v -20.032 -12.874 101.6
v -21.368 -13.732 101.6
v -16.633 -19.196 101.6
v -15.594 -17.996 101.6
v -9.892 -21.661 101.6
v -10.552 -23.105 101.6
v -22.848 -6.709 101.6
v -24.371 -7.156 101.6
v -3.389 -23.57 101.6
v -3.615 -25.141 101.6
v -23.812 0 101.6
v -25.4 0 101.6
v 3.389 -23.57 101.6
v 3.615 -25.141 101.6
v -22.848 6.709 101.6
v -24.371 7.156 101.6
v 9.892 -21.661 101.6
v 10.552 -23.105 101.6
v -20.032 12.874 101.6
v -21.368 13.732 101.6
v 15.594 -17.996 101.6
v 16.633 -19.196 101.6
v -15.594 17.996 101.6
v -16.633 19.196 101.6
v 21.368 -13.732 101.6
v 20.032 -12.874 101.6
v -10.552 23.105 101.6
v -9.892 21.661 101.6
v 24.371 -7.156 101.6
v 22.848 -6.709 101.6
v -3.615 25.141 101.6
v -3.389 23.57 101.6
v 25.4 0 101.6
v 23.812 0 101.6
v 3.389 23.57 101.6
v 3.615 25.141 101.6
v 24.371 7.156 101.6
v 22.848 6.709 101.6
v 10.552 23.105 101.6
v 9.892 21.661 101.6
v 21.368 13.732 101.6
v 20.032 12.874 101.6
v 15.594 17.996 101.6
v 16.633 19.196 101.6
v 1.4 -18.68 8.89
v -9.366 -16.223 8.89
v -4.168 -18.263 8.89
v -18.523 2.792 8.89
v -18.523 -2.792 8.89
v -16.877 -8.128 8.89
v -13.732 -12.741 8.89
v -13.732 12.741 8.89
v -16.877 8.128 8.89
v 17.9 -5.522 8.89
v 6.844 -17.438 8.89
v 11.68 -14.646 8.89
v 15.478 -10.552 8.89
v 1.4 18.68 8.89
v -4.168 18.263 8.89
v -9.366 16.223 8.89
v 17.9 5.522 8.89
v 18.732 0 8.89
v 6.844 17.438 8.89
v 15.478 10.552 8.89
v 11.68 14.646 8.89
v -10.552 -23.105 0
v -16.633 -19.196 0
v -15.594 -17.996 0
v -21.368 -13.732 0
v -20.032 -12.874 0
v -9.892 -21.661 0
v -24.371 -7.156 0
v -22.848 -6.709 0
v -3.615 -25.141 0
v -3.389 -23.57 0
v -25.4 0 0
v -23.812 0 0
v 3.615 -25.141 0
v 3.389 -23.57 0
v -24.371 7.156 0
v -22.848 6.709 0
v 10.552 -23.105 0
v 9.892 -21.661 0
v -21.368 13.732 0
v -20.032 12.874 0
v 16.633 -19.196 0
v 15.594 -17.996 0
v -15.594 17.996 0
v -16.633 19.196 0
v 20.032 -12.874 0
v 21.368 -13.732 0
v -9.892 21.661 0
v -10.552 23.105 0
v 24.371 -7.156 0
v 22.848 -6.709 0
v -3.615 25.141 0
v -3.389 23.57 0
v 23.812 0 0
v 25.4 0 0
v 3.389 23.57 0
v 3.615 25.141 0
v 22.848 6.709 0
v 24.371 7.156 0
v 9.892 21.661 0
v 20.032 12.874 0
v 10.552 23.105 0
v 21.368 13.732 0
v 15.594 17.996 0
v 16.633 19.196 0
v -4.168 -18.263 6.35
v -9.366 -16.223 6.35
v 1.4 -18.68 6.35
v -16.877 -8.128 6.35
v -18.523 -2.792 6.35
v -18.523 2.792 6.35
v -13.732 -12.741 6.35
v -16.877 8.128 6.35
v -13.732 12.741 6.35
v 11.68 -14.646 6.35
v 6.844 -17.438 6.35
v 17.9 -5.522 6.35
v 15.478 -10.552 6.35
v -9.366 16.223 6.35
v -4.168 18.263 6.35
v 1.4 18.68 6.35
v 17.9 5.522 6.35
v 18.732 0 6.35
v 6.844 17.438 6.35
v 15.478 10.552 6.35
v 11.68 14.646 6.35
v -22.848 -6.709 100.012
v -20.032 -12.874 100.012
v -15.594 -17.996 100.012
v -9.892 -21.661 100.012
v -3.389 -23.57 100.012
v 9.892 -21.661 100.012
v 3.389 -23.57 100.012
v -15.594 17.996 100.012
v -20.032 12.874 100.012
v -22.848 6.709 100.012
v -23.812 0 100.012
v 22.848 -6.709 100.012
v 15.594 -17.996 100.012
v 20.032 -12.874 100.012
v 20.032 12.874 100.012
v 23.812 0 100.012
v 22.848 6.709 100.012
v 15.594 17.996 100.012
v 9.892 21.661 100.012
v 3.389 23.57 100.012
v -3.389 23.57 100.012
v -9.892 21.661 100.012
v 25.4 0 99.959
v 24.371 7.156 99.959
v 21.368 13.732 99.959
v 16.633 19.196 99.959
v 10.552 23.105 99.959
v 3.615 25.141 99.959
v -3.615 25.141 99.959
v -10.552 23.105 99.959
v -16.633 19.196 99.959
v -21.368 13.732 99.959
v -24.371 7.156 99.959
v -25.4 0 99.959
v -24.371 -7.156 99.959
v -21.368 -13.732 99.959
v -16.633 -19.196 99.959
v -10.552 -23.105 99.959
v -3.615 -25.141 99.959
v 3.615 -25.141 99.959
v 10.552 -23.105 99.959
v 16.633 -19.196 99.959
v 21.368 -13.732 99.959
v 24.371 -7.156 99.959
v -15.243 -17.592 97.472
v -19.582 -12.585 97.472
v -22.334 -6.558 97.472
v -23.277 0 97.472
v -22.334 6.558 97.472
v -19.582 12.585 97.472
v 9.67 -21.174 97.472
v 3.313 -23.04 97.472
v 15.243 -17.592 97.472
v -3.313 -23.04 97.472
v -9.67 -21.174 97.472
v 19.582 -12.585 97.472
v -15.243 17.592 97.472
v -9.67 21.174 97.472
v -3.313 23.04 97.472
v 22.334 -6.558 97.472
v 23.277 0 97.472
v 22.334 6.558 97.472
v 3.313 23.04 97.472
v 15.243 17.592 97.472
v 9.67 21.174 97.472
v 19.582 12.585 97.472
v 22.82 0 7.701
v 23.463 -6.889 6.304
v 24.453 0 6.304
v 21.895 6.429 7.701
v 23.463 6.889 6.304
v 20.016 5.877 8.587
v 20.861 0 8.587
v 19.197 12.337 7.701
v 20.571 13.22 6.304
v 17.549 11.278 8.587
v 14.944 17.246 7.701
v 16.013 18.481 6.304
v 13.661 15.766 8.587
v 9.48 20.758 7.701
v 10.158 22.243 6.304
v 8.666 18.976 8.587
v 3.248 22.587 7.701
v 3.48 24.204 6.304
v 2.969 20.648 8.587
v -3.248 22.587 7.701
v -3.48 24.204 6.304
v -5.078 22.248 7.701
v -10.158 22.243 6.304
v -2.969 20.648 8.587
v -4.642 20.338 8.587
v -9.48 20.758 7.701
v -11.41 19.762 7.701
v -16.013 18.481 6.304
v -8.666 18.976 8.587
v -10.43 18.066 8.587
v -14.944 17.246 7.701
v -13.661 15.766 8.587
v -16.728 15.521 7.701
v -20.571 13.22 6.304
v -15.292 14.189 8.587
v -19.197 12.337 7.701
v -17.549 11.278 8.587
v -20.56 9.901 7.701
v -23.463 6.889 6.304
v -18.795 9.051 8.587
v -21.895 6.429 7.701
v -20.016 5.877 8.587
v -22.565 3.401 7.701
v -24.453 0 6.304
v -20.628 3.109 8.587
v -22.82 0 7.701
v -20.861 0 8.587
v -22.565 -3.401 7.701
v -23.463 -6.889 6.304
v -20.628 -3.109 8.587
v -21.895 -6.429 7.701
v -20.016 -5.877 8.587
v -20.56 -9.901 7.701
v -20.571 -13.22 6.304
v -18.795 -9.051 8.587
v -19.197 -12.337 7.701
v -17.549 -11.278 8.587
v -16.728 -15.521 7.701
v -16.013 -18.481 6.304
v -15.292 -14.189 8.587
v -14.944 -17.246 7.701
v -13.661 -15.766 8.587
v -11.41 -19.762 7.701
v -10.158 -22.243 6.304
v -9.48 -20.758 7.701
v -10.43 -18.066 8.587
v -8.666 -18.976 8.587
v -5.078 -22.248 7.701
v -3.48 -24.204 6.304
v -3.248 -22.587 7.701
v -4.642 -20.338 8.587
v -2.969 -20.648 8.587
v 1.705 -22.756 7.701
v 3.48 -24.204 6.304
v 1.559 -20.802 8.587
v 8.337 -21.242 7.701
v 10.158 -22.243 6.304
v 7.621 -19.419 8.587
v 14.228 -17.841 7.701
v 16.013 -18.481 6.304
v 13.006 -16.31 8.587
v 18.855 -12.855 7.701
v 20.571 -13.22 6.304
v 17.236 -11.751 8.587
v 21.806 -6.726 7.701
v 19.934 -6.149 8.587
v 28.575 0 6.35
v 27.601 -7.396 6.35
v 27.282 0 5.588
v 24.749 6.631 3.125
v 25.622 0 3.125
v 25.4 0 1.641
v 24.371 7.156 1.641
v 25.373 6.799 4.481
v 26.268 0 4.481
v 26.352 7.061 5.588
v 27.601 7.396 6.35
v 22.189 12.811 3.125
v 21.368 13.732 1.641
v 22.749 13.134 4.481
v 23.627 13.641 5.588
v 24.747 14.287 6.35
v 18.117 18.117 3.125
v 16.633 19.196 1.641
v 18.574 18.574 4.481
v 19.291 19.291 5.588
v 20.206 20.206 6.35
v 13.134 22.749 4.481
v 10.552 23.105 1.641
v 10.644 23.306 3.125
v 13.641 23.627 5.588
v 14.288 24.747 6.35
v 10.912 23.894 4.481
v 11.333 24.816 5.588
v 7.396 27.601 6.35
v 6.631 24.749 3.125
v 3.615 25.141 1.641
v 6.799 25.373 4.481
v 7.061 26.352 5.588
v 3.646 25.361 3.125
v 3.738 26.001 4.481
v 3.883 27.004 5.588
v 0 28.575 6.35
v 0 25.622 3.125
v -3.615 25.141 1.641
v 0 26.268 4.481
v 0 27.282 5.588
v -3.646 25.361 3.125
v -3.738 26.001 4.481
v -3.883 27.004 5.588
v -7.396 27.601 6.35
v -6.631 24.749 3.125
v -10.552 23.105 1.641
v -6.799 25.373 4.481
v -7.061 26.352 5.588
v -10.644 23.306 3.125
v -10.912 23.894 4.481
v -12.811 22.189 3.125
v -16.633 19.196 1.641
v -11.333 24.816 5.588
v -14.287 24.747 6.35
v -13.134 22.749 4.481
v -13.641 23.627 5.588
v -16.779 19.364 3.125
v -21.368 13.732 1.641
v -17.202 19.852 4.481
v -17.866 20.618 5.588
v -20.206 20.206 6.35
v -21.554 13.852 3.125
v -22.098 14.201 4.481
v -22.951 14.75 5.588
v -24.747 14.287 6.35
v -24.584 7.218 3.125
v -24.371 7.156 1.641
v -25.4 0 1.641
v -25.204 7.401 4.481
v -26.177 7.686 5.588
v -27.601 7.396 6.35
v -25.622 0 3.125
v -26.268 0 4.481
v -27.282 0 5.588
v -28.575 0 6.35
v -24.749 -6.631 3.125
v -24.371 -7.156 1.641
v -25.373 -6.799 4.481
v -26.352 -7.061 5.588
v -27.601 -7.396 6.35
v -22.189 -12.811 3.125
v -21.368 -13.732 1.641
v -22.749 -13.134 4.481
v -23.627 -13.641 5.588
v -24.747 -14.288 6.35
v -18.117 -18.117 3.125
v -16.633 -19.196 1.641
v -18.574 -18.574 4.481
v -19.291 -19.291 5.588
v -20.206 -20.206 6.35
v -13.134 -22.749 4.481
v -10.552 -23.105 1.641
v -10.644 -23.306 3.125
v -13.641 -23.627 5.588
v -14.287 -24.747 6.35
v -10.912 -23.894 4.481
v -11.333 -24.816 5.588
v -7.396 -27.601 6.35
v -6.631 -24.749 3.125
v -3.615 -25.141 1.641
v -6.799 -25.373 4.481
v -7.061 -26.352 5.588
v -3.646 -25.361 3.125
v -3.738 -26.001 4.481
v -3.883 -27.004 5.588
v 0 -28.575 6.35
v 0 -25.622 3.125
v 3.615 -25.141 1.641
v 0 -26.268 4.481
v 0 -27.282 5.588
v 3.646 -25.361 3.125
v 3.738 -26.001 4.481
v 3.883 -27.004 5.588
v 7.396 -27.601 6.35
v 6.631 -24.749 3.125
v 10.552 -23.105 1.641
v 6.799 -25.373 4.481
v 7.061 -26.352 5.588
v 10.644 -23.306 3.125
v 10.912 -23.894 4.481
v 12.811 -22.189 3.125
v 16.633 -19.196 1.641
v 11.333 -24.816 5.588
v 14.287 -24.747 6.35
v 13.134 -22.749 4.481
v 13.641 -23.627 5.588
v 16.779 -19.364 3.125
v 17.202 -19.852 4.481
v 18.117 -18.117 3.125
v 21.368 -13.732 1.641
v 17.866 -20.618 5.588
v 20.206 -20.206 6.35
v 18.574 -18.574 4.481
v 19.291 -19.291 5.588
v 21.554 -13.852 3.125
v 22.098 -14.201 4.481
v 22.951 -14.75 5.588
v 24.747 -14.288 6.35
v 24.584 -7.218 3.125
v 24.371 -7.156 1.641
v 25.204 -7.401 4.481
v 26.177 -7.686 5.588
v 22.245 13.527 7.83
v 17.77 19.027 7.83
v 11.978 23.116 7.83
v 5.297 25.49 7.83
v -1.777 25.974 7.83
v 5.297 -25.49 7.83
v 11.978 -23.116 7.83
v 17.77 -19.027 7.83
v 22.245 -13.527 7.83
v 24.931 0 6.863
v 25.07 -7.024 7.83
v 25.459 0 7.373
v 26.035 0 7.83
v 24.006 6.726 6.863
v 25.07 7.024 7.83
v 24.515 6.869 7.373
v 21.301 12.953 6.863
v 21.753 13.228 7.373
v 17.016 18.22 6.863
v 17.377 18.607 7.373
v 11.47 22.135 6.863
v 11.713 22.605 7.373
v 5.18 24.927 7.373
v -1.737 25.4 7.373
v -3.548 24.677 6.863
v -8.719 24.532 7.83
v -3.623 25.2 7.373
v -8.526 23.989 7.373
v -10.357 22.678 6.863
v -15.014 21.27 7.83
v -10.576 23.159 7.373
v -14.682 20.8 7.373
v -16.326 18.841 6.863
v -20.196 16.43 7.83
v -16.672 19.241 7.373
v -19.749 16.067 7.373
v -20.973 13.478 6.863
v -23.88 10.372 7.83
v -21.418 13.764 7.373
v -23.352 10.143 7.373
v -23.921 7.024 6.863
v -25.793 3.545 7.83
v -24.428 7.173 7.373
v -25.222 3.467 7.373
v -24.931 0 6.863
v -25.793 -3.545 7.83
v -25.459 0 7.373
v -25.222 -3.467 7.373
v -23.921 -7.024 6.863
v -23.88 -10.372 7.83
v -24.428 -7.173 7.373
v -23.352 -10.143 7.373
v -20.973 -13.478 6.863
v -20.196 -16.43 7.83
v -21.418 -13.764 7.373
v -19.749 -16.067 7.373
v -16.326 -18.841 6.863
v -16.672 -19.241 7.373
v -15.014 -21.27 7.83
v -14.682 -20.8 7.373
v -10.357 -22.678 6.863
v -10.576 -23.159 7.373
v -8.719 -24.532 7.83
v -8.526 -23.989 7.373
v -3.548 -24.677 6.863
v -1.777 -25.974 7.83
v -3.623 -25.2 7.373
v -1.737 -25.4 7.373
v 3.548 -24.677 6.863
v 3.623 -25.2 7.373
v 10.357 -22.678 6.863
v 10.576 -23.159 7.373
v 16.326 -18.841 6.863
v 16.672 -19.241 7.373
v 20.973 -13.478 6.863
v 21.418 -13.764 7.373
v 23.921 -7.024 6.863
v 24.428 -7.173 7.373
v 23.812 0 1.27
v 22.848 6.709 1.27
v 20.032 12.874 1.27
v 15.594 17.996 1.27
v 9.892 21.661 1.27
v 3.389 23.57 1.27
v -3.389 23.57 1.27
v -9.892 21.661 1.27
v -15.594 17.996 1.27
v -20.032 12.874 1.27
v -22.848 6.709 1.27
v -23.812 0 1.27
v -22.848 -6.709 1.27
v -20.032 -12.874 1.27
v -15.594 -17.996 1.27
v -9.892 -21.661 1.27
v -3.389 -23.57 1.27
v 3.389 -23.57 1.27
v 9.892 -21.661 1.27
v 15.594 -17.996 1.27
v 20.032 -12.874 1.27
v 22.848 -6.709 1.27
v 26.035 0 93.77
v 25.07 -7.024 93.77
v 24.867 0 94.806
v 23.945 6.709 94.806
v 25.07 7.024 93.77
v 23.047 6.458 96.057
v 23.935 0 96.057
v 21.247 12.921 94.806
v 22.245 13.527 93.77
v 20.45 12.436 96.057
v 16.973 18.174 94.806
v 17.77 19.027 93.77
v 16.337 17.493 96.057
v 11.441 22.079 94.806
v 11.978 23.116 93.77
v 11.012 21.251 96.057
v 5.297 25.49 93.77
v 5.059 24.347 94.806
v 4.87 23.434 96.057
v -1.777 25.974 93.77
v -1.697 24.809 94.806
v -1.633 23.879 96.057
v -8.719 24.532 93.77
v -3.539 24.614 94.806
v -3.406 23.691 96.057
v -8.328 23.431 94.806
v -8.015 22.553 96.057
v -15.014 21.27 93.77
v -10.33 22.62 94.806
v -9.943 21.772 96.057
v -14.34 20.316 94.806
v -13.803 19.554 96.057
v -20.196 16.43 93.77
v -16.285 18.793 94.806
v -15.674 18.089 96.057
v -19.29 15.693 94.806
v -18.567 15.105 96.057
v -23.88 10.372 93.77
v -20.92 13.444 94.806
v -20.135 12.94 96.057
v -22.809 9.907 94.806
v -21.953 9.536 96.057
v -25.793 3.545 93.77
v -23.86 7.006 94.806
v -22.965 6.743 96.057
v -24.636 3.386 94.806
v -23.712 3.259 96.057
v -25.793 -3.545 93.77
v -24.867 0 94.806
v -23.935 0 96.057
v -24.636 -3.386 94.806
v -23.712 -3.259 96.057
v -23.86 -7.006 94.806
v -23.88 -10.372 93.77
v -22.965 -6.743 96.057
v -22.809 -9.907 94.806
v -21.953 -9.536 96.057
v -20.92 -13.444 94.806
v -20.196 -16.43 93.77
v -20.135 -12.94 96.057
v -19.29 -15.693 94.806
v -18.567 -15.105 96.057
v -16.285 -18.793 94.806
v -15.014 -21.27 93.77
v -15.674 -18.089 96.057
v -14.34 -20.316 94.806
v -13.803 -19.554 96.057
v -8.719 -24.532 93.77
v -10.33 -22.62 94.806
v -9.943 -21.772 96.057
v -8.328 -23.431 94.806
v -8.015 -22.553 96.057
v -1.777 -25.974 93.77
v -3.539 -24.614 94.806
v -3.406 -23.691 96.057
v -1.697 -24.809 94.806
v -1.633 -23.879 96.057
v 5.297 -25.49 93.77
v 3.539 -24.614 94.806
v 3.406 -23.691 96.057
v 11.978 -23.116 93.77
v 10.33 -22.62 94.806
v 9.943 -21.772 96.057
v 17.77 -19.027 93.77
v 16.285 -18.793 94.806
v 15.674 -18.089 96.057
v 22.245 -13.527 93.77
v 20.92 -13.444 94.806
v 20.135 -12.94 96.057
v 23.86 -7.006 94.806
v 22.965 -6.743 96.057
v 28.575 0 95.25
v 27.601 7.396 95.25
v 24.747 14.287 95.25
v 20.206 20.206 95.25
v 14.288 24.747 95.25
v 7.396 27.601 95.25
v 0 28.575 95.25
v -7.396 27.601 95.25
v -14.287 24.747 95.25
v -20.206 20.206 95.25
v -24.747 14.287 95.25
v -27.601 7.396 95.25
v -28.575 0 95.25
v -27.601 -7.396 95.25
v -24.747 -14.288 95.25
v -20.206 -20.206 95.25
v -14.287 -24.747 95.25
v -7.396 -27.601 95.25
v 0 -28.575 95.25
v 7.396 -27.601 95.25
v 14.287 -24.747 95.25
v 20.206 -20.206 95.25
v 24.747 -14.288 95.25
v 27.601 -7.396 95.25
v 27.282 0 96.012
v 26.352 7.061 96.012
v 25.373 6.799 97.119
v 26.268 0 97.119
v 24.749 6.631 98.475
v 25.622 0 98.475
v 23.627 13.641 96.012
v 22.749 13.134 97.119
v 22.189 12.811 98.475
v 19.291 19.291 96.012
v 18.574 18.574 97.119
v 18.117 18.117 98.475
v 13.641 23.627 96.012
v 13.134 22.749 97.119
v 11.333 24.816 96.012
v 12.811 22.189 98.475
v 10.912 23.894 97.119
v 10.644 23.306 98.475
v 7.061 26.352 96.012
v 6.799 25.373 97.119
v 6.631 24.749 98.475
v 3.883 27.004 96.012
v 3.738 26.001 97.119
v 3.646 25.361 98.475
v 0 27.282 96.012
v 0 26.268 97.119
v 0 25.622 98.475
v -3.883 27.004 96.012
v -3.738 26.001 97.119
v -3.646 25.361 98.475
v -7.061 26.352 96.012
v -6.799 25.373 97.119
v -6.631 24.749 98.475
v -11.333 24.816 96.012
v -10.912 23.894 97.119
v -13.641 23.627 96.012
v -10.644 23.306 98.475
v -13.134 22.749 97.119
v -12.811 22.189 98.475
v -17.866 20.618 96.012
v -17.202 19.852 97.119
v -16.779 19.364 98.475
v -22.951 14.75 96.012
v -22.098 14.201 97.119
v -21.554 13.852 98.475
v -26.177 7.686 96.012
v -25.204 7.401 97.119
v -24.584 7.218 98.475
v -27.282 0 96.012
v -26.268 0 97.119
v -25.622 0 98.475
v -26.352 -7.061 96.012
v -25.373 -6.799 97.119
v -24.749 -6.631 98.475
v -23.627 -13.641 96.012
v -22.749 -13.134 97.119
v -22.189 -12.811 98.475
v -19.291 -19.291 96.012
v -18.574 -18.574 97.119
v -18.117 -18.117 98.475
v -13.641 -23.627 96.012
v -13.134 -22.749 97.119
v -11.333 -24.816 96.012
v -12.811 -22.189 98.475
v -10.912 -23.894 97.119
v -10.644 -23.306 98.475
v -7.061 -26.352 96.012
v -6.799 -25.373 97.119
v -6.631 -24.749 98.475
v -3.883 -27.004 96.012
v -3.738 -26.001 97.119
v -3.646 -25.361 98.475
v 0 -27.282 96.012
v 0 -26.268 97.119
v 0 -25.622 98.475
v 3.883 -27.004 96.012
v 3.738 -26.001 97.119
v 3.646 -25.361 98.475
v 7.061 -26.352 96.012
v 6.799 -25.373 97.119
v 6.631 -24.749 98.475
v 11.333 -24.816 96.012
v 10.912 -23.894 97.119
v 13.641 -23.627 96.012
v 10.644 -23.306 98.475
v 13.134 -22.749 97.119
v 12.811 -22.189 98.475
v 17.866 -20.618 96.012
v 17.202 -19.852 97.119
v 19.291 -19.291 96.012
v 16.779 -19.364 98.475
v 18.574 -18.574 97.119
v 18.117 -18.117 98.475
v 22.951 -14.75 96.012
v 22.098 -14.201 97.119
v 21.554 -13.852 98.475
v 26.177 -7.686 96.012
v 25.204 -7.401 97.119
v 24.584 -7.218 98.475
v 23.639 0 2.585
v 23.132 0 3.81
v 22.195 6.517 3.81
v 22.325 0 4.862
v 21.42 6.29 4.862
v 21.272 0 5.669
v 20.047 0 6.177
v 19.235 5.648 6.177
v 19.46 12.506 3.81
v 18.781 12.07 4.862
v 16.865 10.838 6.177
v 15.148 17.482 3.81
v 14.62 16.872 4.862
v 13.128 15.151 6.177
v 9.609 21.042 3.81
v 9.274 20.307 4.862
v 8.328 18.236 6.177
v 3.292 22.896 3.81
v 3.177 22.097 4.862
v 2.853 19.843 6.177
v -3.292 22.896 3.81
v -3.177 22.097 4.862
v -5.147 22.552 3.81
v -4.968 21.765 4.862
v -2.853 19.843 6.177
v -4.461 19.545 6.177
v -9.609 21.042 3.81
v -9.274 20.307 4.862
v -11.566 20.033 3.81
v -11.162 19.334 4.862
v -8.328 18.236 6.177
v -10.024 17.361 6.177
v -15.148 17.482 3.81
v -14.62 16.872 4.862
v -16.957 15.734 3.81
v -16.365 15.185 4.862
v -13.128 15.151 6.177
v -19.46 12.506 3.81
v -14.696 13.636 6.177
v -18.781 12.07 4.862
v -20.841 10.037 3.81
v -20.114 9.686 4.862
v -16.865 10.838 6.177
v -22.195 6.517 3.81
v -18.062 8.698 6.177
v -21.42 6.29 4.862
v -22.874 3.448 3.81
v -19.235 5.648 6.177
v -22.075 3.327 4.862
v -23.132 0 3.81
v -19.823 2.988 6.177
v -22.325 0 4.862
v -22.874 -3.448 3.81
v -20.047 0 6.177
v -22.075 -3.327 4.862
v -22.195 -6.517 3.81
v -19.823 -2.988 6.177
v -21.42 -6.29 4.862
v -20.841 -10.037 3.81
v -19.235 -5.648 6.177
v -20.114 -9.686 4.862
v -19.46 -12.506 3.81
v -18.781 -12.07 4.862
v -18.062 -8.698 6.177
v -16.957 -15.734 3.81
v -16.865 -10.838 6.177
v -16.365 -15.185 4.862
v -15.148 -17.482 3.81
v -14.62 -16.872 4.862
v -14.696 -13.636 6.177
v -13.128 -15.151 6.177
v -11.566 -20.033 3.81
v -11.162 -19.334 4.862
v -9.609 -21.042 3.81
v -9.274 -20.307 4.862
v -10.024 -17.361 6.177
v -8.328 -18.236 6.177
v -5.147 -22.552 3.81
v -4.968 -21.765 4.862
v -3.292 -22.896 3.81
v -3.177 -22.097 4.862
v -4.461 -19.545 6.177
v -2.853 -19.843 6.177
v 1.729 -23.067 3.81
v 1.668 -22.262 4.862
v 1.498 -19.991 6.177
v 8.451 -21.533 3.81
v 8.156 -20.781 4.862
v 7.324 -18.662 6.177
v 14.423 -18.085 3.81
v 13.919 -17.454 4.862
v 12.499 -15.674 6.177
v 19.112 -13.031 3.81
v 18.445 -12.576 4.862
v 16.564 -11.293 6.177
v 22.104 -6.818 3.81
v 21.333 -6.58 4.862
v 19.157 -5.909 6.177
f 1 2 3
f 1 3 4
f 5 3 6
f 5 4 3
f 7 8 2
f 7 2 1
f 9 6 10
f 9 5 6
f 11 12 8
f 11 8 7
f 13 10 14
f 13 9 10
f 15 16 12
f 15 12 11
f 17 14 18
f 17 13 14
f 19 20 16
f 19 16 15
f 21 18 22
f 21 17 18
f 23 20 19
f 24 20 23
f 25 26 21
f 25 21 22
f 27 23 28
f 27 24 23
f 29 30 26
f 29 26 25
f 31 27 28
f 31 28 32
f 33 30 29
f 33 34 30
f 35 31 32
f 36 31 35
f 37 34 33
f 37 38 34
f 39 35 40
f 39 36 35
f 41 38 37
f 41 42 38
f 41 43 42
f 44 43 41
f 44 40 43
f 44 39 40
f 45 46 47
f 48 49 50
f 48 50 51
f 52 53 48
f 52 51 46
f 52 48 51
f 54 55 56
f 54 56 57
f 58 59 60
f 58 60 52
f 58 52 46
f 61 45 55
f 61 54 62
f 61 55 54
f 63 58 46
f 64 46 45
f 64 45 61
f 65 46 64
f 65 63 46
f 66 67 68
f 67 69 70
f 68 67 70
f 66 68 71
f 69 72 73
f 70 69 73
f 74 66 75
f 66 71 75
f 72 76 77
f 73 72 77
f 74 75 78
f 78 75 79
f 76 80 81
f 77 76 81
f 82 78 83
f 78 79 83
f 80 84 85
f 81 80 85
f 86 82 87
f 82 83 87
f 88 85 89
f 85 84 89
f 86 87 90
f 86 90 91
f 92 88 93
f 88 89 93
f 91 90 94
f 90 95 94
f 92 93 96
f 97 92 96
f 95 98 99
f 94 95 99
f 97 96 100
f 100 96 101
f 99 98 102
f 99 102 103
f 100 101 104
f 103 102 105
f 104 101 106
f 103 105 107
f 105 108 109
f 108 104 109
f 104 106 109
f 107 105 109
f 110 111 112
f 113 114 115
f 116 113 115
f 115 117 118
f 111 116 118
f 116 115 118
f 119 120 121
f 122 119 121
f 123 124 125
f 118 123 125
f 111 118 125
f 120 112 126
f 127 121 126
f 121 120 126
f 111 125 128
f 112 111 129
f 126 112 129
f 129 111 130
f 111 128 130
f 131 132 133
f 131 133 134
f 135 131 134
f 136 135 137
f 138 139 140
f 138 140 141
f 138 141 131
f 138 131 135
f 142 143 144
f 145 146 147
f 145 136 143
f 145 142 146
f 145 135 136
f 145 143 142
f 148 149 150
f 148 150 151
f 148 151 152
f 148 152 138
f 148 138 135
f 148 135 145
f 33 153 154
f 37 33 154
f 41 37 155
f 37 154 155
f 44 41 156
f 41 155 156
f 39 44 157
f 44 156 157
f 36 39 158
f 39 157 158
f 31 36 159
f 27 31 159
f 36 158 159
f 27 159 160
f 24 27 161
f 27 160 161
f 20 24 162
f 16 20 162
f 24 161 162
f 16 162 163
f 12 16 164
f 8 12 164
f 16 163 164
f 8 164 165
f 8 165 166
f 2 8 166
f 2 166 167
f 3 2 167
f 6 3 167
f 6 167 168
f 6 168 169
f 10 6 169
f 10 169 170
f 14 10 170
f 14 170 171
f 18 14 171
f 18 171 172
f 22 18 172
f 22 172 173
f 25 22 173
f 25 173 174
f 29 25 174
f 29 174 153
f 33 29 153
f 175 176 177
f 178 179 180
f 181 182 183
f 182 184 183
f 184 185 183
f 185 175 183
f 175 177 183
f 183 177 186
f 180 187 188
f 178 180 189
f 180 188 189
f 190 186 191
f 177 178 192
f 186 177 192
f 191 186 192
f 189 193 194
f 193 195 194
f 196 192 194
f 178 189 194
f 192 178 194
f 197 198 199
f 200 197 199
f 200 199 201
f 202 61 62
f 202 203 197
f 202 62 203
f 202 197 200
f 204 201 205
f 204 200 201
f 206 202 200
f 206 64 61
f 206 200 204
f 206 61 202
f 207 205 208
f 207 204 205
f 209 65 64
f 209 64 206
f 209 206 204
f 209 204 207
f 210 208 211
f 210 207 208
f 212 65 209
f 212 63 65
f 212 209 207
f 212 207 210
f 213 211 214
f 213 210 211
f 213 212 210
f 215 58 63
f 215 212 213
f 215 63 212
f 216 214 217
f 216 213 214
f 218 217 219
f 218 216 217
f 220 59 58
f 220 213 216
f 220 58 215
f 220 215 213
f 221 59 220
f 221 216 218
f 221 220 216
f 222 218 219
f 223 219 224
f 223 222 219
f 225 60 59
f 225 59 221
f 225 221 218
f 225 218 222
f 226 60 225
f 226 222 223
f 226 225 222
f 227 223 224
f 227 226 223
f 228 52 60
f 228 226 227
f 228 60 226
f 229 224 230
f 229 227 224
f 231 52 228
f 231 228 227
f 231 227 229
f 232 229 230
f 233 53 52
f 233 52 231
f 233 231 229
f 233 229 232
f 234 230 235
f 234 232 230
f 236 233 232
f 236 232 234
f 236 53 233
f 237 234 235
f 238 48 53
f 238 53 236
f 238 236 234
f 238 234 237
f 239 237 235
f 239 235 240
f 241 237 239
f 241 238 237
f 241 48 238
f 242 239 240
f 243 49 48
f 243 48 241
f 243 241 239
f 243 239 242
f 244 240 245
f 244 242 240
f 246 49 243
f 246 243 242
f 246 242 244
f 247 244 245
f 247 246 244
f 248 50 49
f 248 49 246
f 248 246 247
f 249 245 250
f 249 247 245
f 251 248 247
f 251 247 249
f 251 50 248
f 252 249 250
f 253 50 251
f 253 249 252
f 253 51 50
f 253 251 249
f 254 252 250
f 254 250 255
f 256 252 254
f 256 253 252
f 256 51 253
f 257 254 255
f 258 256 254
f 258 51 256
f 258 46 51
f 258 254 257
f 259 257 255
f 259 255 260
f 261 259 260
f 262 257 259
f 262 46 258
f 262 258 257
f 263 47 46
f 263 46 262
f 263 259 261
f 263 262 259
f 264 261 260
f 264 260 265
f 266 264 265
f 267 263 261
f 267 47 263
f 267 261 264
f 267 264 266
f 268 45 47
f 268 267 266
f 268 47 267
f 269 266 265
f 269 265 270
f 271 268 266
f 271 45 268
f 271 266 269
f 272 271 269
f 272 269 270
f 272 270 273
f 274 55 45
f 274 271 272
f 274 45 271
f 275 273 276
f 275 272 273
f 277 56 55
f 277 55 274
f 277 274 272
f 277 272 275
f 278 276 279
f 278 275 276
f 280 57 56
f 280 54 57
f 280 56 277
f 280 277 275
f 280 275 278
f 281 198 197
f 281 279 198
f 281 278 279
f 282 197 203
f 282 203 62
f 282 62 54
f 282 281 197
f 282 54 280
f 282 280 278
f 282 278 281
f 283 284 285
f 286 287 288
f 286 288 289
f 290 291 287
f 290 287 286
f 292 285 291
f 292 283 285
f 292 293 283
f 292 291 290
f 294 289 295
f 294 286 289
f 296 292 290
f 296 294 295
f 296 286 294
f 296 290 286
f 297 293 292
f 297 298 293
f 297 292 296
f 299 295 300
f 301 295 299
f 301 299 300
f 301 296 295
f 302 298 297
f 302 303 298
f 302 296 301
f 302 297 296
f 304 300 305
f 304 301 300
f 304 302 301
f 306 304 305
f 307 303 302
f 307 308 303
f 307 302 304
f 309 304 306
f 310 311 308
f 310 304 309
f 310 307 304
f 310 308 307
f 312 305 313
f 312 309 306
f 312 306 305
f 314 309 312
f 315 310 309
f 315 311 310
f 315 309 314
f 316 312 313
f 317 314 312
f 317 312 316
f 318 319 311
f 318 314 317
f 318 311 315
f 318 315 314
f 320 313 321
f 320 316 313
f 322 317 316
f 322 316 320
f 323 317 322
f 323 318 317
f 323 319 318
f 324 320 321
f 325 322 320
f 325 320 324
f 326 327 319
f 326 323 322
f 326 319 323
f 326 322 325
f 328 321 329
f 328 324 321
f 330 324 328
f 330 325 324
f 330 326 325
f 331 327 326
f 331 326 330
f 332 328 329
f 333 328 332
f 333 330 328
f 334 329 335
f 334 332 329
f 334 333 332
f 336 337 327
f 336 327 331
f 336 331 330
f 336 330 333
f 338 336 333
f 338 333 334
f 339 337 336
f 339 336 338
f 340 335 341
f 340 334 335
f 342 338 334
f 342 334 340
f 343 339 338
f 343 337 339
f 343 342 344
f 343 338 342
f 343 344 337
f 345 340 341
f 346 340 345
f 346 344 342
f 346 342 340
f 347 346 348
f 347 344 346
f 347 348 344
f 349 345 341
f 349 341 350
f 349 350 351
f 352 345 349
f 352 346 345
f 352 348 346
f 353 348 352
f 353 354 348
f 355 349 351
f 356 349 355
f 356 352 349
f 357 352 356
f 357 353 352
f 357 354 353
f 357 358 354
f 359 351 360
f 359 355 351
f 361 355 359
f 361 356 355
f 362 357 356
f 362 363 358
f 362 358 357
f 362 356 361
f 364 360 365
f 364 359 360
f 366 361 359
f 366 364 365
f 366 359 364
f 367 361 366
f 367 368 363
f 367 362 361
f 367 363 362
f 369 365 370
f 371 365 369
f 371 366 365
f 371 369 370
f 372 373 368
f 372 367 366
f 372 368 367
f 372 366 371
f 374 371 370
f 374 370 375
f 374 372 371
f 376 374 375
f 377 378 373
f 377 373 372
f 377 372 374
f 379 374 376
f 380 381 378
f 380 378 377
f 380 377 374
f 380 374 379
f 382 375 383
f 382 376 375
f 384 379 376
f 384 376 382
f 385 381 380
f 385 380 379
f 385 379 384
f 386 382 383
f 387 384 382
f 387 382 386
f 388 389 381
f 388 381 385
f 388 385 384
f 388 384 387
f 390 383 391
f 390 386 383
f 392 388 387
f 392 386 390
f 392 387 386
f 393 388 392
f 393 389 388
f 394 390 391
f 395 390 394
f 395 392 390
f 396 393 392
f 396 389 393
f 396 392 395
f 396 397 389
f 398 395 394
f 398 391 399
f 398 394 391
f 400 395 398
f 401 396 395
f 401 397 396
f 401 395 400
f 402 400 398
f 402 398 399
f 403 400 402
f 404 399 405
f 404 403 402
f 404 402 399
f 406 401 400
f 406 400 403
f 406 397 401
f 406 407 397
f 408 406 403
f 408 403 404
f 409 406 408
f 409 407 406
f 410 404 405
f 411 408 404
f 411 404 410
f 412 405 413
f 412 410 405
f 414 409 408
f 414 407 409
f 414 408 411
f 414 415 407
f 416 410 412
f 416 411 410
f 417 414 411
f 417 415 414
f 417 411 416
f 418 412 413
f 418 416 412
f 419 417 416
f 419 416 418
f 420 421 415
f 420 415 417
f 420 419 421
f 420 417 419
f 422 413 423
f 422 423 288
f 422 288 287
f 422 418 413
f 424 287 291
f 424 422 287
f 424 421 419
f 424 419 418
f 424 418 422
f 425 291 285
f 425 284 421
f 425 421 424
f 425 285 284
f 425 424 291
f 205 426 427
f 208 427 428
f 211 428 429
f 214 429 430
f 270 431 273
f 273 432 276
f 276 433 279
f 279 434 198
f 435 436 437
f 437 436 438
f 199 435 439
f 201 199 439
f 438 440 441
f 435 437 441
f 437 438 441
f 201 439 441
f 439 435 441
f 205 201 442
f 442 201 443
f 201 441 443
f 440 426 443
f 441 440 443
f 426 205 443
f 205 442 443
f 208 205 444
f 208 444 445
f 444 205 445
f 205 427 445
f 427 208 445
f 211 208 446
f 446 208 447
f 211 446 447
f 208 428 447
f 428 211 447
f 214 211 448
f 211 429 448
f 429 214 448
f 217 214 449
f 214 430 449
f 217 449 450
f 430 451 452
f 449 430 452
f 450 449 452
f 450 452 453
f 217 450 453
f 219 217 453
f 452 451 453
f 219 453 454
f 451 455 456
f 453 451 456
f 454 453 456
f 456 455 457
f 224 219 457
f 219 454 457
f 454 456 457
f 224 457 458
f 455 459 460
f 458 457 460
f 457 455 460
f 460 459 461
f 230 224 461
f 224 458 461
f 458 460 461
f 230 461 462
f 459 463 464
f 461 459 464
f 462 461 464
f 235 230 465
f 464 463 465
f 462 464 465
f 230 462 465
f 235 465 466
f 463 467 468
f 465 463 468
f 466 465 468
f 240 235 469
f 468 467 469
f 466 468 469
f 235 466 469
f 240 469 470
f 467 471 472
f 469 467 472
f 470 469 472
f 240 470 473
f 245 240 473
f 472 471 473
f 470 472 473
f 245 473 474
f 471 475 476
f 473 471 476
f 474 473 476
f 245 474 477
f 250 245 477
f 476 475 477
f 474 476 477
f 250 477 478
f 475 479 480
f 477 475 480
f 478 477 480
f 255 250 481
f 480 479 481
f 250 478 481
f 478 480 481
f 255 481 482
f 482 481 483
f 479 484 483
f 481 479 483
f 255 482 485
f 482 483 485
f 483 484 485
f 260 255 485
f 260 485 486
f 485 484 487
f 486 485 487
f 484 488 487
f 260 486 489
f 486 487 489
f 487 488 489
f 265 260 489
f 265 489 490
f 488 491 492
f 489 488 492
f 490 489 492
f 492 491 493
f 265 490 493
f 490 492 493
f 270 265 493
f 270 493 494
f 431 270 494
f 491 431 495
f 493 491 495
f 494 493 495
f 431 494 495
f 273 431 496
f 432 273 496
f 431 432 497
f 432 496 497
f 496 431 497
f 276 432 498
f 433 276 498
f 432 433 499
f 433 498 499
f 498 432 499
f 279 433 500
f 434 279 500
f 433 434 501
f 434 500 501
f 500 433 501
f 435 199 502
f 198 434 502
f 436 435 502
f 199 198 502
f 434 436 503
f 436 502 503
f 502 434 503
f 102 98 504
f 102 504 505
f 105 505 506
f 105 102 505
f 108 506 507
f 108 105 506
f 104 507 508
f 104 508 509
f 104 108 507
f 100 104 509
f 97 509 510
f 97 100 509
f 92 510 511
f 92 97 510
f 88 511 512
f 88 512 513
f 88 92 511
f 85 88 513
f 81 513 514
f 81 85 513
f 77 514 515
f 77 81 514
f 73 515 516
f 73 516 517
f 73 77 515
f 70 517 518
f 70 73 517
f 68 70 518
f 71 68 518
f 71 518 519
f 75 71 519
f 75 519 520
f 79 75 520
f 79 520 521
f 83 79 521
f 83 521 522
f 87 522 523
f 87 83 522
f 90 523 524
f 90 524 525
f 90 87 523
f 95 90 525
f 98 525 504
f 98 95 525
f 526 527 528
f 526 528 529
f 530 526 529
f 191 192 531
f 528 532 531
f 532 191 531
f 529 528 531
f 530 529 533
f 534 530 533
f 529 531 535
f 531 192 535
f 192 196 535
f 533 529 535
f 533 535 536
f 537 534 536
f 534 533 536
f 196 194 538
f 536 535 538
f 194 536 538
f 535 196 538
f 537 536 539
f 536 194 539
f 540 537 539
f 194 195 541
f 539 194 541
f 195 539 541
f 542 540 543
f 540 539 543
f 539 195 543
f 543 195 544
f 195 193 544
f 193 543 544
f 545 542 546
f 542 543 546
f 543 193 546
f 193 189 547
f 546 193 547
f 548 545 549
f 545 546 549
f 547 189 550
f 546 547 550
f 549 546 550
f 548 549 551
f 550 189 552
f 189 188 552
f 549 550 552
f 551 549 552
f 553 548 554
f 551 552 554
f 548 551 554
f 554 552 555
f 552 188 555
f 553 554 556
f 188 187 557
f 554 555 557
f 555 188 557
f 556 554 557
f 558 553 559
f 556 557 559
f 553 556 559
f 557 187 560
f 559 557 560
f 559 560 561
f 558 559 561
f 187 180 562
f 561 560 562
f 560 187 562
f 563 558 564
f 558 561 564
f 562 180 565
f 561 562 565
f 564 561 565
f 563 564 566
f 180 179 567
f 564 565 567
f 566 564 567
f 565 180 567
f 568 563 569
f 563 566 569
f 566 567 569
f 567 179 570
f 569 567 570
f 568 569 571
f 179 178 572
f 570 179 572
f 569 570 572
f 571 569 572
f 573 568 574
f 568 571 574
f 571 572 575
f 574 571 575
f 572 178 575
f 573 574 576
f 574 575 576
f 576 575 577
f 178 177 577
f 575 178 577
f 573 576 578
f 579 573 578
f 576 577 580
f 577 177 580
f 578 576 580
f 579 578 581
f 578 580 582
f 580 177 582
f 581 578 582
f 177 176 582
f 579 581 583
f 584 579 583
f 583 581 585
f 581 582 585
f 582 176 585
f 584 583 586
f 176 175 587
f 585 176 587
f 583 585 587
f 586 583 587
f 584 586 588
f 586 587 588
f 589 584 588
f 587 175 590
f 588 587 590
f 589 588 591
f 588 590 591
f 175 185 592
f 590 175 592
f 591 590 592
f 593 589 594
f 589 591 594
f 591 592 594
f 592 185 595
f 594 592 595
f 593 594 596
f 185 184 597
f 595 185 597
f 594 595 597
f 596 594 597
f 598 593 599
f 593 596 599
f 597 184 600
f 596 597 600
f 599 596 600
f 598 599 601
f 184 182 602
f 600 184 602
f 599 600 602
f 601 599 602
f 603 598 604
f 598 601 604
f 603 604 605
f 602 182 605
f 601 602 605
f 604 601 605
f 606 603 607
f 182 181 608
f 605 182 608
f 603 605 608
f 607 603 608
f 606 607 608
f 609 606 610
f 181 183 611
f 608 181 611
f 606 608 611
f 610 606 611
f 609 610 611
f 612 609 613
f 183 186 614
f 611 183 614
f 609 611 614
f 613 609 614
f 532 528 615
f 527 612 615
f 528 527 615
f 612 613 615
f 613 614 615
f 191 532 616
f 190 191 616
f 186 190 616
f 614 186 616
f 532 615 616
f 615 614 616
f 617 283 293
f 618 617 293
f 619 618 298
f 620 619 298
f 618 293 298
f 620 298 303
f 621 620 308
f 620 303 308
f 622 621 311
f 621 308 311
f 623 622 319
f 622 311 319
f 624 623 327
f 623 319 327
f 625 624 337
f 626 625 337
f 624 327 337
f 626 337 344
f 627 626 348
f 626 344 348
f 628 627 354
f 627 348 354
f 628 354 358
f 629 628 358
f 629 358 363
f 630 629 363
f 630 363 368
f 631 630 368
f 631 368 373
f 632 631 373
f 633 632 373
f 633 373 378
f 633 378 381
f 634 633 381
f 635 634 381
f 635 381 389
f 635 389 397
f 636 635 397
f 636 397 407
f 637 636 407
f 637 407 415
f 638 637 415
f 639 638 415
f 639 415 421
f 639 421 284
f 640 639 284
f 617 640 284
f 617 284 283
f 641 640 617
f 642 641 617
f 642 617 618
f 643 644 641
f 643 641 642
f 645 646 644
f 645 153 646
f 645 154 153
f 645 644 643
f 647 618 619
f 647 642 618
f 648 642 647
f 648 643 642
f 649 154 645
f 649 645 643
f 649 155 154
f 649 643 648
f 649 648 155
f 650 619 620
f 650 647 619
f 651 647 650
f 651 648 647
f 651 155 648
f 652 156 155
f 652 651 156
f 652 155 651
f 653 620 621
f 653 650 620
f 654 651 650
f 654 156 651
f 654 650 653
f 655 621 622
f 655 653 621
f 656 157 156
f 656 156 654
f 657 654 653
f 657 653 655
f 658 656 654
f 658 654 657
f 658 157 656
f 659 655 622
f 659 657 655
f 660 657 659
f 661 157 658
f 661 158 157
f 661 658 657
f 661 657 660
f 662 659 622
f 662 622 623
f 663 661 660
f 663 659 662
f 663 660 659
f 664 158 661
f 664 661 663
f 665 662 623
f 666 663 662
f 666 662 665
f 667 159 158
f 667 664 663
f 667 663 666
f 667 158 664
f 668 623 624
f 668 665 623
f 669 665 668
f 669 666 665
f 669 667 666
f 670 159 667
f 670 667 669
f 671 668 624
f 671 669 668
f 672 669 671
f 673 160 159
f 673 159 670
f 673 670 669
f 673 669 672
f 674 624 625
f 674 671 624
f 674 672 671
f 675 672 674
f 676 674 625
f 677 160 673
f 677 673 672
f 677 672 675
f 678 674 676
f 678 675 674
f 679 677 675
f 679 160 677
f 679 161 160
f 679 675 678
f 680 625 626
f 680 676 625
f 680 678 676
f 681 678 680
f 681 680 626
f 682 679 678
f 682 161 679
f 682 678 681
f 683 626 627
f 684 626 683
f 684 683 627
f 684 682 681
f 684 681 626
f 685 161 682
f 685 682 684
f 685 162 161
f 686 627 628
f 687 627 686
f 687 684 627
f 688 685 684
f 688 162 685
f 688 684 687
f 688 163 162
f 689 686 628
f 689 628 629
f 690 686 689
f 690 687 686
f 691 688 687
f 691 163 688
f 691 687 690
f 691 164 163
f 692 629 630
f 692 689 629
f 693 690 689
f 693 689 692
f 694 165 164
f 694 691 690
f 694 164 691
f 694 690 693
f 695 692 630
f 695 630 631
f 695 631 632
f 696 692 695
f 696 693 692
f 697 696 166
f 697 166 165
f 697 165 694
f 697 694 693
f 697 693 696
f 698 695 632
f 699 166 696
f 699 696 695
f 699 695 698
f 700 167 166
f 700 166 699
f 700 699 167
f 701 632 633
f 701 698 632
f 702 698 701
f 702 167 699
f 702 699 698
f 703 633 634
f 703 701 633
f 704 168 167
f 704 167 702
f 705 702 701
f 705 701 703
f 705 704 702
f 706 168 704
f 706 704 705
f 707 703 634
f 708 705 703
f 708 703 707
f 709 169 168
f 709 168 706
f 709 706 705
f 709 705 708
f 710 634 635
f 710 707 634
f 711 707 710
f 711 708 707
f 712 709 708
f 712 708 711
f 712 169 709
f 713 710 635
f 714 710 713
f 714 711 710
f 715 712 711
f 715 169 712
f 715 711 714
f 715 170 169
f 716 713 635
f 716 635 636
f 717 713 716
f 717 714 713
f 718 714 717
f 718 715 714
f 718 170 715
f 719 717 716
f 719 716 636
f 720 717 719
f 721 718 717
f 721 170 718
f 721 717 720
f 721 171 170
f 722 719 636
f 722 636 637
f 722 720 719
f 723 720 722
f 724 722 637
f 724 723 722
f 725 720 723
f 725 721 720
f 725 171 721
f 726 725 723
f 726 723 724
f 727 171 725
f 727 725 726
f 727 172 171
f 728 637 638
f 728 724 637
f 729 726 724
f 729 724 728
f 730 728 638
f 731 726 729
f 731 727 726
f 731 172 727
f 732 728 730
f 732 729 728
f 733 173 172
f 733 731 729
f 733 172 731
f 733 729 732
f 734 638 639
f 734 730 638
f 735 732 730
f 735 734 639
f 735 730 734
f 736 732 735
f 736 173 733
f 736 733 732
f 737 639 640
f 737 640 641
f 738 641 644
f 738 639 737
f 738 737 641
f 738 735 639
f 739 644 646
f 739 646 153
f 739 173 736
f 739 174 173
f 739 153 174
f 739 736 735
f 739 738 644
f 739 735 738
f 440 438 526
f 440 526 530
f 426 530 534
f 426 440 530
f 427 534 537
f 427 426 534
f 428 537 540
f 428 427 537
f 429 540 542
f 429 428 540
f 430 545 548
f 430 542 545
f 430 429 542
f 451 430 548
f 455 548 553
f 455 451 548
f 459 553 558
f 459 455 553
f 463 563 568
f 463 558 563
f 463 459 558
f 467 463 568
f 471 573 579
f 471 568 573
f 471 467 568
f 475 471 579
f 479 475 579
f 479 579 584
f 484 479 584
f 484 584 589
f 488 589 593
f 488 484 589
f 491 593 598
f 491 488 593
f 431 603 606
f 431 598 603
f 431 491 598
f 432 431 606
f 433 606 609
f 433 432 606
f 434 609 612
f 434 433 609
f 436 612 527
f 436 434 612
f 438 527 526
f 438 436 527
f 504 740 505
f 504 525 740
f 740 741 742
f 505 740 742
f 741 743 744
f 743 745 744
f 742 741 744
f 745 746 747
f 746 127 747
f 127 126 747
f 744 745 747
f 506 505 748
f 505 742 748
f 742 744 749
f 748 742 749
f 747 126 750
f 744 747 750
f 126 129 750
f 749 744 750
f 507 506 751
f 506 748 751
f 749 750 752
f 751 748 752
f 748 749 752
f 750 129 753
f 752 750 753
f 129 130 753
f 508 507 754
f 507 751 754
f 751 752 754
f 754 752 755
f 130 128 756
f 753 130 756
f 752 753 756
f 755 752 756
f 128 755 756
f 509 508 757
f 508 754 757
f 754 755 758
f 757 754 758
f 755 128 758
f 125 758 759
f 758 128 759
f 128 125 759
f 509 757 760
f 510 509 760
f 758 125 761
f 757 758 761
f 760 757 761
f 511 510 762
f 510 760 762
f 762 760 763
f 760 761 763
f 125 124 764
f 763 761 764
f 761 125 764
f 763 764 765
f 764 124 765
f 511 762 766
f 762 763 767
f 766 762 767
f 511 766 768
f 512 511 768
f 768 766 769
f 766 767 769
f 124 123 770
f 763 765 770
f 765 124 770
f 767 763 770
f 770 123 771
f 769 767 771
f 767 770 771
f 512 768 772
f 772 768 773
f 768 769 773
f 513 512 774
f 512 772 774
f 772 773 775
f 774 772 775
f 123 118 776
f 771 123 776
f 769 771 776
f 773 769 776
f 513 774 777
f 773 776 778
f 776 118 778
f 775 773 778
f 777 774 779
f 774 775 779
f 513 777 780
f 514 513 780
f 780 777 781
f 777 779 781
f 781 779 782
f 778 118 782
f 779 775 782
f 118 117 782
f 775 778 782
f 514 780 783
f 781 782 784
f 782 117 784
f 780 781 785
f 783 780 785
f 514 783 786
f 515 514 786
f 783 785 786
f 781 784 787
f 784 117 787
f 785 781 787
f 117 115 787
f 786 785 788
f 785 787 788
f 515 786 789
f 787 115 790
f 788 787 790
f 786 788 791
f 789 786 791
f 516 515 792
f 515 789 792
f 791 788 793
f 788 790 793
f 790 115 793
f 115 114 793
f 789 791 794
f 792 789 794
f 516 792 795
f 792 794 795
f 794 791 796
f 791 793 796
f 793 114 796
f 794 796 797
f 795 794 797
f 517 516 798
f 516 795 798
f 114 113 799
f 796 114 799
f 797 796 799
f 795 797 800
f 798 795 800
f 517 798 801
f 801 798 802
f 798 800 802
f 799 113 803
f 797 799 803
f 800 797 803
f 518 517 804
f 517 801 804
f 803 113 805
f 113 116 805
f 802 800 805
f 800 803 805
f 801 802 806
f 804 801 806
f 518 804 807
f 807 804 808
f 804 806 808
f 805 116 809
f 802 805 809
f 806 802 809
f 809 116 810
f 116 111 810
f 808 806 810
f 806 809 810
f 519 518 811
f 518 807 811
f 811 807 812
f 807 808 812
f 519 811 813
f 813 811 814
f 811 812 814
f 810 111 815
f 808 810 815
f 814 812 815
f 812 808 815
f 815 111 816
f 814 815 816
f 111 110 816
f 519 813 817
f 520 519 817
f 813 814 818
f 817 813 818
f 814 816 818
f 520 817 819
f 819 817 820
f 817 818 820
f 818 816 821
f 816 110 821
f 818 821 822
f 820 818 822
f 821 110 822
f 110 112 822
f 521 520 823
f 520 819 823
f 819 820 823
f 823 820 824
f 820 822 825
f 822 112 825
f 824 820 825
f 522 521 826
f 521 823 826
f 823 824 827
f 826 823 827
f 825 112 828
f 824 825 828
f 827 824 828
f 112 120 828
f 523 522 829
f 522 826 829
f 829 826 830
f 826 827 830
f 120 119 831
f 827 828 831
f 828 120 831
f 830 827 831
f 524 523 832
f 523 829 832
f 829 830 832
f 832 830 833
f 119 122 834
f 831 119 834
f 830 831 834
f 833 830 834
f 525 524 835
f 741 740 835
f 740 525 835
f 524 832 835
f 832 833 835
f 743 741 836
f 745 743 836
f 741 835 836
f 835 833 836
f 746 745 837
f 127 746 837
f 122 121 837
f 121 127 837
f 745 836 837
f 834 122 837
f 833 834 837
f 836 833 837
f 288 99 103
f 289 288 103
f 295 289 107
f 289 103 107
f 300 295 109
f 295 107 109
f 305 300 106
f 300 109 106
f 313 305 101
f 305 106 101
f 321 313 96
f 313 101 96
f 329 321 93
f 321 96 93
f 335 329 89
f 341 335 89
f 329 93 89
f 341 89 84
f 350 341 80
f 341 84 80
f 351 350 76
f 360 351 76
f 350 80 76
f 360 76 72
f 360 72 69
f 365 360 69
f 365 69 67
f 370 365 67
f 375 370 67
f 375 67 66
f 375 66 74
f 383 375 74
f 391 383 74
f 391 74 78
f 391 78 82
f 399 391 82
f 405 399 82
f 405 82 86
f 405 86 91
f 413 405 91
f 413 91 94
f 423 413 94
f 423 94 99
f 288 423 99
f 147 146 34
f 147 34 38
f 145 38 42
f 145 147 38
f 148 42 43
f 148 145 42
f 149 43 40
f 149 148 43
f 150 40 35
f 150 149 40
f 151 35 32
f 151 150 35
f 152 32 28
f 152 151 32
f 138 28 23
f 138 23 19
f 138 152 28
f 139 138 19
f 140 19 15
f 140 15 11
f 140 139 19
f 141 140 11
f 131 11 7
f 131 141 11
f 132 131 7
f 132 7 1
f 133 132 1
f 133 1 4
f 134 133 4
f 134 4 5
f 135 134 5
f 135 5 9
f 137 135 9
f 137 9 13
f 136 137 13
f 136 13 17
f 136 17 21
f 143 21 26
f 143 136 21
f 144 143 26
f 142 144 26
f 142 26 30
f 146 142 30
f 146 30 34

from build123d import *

# Parameters (mm, degrees)
F0_R     = 28.575
F0_R_2   = 25.4
F1_DEPTH = 95.25
F0_R_3   = 23.8125
F2_DEPTH = 101.6
F3_DEPTH = 6.35
F4_DEPTH = 100.0125
F5_DEPTH = 6.35
F6_DEPTH = 6.35
F7_R     = 5.08
F9_T     = -2.54


# Not quite as in the source:
# - a fillet or chamfer that OpenCascade refuses, or shapes differently, is made with other operations: its cross-section is extruded or revolved along the edge and cut away or added


with BuildPart() as f1:
    # F0 (on Top) → F1 (new body)
    with BuildSketch(Plane.XY):
        Circle(F0_R)
        Circle(F0_R_2, mode=Mode.SUBTRACT)
    extrude(amount=F1_DEPTH)

    # F0 (on Top) → F2 (join)
    with BuildSketch(Plane.XY):
        Circle(F0_R_2)
        Circle(F0_R_3, mode=Mode.SUBTRACT)
    extrude(amount=F2_DEPTH)

    # F0 (on Top) → F3 (cut)
    with BuildSketch(Plane.XY):
        Circle(F0_R)
        Circle(F0_R_2, mode=Mode.SUBTRACT)
    extrude(amount=F3_DEPTH, mode=Mode.SUBTRACT)

    # F0 (on Top) → F4 (join)
    with BuildSketch(Plane.XY):
        Circle(F0_R_3)
    extrude(amount=F4_DEPTH)

    # F0 (on Top) → F5 (join)
    with BuildSketch(Plane.XY):
        Circle(F0_R_3)
    extrude(amount=F5_DEPTH)

    # F0 (on Top) → F6 (cut)
    with BuildSketch(Plane.XY):
        Circle(F0_R_3)
    extrude(amount=F6_DEPTH, mode=Mode.SUBTRACT)

    # F7
    f7_edges = [f1.edges().sort_by_distance(p)[0] for p in [
        (-23.8125, 0, 6.35),
    ]]
    fillet(f7_edges, radius=F7_R)

    # F8: fillet of radius 5.08 on 2 edges, made by hand

    # F8_s1 → F8_t2 (revolve)
    with BuildSketch(Plane.XZ):
        with BuildLine():
            ThreePointArc((25.4, 1.6407139607), (26.2678865162, 4.4805202921), (28.575, 6.35))
            Line((28.575, 6.35), (25.4, 6.35))
            Line((25.4, 6.35), (25.4, 1.6407139607))
        make_face()
    revolve(axis=Axis((0, 0, 6.35), (0, 0, 1)))

    # F8_s3 → F8_t4 (revolve)
    with BuildSketch(Plane.XZ):
        with BuildLine():
            ThreePointArc((28.575, 95.25), (26.2678865162, 97.1194797079), (25.4, 99.9592860393))
            Line((25.4, 99.9592860393), (25.4, 95.25))
            Line((25.4, 95.25), (28.575, 95.25))
        make_face()
    revolve(axis=Axis((0, 0, 95.25), (0, 0, 1)))

    # F9 (hollow: no face is removed)
    offset(amount=F9_T, mode=Mode.SUBTRACT)


solid = f1.part
